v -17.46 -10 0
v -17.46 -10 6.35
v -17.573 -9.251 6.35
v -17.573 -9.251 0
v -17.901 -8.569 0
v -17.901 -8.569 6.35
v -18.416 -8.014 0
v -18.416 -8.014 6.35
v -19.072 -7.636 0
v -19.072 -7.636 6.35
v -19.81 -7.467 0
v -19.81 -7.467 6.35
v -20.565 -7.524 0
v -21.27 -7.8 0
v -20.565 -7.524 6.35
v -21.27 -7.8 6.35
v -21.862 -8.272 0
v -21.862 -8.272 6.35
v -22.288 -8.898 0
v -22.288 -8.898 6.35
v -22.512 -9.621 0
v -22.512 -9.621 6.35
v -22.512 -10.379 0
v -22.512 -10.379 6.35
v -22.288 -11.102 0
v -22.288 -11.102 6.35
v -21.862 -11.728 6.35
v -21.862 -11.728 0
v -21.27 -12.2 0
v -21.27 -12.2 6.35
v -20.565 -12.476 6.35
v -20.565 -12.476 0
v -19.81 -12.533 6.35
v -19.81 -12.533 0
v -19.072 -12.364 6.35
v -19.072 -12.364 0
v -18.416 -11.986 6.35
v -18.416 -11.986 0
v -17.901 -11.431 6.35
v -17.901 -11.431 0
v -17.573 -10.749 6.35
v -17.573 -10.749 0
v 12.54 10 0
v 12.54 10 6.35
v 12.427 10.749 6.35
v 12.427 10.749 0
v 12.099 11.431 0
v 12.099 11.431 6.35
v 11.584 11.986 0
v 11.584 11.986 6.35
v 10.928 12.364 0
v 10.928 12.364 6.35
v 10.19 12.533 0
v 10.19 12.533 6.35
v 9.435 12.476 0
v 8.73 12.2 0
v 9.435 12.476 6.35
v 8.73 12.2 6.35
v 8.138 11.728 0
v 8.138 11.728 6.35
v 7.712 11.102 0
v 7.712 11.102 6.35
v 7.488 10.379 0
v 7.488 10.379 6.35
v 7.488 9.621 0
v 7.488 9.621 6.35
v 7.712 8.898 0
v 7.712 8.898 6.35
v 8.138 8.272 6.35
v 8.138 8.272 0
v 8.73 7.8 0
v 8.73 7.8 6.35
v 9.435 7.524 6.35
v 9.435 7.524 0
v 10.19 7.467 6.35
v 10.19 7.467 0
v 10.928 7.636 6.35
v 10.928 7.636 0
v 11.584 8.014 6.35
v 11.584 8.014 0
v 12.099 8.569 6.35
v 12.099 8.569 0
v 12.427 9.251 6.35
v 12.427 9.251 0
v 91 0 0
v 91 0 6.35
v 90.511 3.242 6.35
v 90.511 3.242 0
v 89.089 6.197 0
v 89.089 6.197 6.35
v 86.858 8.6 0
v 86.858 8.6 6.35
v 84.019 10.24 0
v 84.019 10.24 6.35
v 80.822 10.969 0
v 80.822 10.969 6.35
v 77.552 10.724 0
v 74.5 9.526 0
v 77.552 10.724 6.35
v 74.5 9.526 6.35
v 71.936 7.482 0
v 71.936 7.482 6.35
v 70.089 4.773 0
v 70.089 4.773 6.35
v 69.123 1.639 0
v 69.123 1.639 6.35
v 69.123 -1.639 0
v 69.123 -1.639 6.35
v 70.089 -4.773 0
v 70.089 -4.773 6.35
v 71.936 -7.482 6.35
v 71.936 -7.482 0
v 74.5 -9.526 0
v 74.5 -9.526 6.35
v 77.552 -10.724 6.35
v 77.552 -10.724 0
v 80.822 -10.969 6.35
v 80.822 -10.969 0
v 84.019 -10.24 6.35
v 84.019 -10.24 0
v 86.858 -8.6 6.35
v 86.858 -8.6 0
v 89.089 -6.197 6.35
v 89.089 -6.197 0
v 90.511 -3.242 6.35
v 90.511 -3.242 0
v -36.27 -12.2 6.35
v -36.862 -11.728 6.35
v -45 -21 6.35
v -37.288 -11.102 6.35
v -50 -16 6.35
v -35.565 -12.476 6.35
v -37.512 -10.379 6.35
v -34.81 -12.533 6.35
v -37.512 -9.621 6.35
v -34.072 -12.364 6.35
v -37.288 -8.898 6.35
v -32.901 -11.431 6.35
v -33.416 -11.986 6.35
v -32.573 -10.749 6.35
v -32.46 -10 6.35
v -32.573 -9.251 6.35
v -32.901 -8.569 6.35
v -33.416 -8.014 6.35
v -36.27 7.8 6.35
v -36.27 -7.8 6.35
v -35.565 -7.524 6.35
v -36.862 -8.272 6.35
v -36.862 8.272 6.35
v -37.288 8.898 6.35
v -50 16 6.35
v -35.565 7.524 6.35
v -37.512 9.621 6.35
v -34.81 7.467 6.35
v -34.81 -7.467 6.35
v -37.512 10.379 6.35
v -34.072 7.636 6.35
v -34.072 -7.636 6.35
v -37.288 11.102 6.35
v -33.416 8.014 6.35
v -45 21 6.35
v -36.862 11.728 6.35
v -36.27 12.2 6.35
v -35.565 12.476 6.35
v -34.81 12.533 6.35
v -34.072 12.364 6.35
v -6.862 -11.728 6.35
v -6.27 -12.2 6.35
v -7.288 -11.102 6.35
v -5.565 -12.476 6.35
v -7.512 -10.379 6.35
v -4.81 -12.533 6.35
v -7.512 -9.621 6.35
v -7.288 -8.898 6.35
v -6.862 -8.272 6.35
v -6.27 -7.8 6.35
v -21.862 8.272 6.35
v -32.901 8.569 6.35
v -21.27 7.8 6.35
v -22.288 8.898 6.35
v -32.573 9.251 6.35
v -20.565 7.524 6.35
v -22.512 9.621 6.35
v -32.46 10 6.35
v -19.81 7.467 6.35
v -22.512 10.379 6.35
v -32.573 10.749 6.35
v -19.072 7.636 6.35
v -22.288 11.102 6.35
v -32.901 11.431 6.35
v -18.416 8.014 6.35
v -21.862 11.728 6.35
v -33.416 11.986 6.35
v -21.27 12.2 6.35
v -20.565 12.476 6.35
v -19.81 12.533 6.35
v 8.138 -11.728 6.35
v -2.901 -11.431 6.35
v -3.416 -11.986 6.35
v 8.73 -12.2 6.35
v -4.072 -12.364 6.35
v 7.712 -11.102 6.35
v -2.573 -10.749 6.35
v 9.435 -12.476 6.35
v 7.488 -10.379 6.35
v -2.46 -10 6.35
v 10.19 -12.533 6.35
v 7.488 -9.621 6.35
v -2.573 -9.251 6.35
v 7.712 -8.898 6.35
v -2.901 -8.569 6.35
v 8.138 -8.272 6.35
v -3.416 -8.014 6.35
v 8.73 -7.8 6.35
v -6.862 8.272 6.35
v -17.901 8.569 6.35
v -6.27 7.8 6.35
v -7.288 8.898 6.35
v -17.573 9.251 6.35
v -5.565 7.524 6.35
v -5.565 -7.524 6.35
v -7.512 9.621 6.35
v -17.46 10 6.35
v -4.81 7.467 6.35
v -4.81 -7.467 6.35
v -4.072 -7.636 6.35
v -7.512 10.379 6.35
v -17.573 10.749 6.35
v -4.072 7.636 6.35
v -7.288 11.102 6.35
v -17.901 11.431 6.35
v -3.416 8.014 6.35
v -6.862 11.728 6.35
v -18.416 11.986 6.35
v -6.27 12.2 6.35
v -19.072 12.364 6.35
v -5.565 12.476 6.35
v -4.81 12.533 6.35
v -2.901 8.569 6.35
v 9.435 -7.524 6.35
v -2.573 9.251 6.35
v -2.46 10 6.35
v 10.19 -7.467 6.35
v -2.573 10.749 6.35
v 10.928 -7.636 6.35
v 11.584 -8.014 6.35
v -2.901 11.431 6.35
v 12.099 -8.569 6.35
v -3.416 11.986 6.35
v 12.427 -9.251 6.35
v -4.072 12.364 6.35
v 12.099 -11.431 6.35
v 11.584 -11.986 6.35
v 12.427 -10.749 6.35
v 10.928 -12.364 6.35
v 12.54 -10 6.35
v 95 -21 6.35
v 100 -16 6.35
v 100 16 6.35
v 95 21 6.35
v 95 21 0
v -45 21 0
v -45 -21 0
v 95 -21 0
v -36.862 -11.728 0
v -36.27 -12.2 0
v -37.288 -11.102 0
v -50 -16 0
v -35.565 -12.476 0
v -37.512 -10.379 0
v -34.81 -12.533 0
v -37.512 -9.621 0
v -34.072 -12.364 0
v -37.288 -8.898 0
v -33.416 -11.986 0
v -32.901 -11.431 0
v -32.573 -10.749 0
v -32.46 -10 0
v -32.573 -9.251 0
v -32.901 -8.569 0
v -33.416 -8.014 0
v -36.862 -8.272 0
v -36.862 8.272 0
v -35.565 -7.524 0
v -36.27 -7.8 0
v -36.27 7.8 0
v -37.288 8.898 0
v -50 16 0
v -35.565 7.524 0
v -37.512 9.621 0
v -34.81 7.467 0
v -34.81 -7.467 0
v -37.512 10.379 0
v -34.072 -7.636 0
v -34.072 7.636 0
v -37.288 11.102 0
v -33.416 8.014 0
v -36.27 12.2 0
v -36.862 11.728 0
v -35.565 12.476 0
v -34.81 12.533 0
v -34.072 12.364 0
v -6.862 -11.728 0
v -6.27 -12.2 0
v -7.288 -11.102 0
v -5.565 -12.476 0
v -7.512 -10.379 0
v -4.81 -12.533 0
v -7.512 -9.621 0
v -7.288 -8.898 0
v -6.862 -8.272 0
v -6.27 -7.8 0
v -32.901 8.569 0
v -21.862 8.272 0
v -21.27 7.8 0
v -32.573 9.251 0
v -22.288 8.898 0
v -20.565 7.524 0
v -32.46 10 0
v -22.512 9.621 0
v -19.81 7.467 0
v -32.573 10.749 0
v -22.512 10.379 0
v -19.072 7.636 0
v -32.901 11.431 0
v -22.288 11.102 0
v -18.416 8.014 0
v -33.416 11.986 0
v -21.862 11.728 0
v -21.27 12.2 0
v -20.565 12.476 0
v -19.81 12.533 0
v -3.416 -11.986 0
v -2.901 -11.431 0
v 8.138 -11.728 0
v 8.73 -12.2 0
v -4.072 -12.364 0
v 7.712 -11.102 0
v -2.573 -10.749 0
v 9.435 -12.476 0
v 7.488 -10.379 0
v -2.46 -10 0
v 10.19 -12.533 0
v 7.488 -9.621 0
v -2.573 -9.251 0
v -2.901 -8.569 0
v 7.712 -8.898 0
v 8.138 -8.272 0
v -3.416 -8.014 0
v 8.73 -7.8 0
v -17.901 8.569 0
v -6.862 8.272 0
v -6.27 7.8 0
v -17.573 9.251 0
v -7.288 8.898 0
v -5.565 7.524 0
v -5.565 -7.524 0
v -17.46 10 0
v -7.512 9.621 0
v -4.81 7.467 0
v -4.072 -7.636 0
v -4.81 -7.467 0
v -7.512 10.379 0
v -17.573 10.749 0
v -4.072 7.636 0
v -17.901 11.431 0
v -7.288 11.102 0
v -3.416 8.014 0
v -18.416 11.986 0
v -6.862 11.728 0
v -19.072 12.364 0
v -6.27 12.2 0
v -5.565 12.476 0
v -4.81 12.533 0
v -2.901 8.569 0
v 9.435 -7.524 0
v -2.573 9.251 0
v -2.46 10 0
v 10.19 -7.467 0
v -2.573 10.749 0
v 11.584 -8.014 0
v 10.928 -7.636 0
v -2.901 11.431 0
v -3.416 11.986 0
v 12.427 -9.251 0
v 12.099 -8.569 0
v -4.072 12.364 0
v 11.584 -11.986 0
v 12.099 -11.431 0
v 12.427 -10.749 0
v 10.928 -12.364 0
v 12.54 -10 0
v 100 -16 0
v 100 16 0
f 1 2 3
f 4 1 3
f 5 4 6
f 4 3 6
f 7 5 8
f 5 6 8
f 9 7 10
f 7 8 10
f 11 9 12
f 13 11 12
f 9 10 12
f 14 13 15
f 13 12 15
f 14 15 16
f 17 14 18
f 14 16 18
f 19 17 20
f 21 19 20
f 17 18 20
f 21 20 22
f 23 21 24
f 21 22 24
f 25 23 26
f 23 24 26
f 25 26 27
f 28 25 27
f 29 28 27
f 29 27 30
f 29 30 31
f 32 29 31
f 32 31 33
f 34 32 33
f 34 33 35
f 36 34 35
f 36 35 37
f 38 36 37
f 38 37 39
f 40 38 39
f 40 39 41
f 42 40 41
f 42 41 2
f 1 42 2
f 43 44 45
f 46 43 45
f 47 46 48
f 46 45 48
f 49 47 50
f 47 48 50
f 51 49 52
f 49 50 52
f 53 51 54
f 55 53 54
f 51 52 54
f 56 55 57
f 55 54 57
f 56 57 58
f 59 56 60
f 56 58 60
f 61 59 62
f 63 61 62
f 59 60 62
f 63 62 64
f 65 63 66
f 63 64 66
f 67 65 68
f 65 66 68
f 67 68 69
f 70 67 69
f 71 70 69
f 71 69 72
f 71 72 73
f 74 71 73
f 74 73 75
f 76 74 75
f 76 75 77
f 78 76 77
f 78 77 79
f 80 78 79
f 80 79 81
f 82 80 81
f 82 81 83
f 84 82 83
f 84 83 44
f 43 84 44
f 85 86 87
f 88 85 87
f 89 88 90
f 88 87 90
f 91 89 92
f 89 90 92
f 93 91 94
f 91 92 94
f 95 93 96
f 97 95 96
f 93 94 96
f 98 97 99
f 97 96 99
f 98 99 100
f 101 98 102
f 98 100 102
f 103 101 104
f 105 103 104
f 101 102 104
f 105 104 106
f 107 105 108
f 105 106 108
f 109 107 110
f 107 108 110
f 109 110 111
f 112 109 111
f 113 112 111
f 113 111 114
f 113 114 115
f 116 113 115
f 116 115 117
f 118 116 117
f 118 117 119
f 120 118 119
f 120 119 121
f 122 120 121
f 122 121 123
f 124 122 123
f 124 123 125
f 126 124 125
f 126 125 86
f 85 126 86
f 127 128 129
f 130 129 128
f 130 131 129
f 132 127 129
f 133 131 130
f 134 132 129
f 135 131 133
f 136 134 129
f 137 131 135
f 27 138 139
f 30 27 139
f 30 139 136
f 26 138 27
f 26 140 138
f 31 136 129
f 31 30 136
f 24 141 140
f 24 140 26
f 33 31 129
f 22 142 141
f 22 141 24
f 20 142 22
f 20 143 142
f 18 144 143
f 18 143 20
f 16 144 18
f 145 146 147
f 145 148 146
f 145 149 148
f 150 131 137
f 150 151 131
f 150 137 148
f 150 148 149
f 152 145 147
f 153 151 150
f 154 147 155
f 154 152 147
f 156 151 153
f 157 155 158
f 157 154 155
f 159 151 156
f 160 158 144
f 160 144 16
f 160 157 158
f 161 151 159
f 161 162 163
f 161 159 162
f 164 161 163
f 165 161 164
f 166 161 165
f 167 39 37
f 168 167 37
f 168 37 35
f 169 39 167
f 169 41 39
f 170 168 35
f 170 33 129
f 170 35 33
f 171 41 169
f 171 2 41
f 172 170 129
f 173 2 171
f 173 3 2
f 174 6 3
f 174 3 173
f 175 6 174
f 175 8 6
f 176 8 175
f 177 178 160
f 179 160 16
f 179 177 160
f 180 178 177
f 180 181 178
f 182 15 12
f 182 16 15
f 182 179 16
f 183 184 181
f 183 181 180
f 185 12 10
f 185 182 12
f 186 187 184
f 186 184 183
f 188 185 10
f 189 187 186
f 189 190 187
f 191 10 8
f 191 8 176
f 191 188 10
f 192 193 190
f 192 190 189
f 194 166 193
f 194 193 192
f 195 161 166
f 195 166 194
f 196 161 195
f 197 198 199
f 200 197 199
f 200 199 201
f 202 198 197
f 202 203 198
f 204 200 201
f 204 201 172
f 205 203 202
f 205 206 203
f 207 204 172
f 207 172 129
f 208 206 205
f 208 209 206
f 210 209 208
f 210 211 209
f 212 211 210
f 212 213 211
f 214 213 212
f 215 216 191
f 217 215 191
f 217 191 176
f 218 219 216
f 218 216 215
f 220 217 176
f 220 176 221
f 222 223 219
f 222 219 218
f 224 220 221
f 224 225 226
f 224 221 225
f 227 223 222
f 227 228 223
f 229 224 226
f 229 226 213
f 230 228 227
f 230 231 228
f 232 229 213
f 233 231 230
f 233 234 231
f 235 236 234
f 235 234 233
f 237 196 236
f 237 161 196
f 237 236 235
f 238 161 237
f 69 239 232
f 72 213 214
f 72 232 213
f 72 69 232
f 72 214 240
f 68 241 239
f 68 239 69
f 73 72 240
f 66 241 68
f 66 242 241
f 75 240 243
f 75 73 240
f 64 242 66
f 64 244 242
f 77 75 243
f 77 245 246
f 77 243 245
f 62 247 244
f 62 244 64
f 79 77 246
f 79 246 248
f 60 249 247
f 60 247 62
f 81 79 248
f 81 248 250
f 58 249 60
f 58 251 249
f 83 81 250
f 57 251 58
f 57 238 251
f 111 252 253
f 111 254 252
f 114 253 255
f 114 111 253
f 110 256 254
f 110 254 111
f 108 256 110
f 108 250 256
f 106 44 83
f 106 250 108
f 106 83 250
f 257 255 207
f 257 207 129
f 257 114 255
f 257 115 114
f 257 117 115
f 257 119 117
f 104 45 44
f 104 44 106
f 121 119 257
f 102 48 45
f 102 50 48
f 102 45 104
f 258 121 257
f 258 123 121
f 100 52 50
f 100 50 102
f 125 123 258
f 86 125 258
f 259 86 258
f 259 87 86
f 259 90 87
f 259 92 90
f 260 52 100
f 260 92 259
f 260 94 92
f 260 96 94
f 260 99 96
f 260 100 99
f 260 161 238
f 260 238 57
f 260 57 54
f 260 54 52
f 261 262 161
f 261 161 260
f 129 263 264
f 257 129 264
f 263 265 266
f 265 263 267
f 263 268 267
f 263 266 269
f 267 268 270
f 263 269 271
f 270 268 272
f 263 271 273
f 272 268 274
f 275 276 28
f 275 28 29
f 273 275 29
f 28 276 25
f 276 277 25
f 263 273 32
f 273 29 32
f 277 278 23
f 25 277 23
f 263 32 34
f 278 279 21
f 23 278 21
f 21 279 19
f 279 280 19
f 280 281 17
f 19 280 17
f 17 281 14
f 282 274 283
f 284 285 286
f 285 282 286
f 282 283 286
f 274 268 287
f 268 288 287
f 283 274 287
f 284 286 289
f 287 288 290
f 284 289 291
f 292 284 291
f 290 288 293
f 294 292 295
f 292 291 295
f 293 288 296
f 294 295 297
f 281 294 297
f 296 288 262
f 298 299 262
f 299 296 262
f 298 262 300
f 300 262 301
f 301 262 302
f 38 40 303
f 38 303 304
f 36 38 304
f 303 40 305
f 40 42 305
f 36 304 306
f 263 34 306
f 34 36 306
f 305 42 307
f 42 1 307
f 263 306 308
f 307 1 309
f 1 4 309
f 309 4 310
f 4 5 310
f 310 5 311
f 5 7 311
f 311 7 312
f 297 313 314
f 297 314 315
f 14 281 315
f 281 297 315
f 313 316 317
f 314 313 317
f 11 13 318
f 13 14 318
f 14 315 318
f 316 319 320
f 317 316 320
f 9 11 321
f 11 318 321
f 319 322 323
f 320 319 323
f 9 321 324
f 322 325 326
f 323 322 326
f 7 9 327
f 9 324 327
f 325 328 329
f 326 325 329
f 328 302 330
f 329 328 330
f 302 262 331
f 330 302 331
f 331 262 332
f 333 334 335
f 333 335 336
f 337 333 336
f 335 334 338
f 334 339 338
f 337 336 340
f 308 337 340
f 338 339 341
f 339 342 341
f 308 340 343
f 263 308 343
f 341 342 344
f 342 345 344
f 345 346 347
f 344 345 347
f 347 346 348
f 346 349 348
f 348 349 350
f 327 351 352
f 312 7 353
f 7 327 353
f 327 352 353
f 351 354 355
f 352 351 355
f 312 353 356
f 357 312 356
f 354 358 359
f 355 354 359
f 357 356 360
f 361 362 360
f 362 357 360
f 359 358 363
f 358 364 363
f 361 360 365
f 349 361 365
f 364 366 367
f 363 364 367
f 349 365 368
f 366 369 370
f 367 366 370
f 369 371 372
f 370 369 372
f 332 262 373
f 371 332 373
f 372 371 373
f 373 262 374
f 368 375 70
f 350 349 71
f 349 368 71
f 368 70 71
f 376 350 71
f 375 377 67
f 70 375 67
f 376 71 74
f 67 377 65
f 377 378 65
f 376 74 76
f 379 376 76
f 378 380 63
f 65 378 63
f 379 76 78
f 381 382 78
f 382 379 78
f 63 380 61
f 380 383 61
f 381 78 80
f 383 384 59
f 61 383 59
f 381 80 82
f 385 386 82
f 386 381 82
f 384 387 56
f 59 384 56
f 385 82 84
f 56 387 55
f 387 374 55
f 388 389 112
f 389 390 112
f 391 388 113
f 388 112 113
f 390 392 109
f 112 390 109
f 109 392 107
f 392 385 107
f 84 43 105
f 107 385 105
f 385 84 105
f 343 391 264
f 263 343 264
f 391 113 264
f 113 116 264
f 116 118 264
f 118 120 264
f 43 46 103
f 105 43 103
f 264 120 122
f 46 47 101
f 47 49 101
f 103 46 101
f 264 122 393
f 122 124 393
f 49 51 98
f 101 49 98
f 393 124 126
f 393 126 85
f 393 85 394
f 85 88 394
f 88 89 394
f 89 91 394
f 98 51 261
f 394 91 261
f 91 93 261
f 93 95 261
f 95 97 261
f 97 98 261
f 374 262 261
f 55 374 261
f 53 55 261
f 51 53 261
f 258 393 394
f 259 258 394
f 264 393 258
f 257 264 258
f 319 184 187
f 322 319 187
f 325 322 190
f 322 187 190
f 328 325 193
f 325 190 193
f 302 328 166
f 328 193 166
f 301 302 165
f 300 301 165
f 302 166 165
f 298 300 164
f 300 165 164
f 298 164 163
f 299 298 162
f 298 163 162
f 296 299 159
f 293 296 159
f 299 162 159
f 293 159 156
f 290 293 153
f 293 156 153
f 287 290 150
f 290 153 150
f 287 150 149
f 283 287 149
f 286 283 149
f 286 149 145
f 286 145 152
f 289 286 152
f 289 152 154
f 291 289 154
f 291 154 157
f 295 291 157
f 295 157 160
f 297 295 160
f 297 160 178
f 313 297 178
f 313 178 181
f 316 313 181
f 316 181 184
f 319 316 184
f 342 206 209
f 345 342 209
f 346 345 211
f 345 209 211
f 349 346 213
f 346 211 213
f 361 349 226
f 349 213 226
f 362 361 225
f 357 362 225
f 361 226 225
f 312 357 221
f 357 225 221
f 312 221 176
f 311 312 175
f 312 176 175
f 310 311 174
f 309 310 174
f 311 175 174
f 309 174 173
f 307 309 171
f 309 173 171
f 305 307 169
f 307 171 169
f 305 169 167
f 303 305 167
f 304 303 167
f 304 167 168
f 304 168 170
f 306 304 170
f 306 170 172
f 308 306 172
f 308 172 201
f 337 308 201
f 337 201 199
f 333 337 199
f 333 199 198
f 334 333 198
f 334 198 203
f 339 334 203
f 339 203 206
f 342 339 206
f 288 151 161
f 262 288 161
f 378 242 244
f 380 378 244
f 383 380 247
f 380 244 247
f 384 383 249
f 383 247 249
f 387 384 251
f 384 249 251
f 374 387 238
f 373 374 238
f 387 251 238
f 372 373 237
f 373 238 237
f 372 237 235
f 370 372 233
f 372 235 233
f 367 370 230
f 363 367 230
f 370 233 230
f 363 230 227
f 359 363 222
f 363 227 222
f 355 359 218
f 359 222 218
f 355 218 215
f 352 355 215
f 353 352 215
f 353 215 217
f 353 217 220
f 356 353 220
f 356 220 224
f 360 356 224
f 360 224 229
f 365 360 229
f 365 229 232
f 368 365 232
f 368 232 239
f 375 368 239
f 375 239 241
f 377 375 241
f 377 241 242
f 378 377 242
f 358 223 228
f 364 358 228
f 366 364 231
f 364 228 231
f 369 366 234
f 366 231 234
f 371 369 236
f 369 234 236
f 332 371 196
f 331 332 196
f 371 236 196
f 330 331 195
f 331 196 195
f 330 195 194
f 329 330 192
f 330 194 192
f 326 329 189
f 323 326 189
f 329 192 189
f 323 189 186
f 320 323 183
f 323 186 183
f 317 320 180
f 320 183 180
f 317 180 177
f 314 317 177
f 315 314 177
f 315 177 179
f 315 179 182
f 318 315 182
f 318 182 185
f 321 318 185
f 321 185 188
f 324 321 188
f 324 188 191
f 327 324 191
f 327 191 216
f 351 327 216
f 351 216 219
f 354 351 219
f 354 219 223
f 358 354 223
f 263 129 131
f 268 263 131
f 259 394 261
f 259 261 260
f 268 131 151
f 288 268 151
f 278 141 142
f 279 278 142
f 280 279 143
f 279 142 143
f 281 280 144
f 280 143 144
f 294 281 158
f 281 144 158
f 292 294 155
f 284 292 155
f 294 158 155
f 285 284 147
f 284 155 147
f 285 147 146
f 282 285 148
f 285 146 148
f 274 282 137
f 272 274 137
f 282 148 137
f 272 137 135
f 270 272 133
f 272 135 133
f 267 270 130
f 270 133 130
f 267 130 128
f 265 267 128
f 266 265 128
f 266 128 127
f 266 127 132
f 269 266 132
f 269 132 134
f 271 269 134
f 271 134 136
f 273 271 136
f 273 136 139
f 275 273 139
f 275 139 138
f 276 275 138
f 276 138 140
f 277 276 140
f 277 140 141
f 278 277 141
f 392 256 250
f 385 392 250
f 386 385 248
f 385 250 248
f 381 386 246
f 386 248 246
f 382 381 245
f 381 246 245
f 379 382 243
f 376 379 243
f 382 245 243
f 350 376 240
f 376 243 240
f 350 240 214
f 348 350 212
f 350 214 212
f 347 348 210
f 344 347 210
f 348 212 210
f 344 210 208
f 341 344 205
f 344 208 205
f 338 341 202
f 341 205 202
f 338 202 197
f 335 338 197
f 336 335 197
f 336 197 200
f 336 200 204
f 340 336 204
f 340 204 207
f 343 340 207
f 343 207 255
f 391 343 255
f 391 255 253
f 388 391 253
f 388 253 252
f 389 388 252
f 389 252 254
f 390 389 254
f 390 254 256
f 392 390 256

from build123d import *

# Parameters (mm, degrees)
SKETCH1_W           = 200
SKETCH1_H           = 42
BOSS_EXTRUDE1_DEPTH = 6.35
SKETCH4_R           = 2.286
CUT_EXTRUDE3_DEPTH  = 7.35
CHAMFER1_SIZE       = 5
SKETCH9_R           = 11
CUT_EXTRUDE8_DEPTH  = 7.35
SKETCH12_R          = 2.286
CUT_EXTRUDE11_DEPTH = 7.35
SKETCH13_R          = 2.286
SKETCH13_R_2        = 2.54
CUT_EXTRUDE12_DEPTH = 10


with BuildPart() as part:
    # Sketch1 → Boss-Extrude1 (new body)
    with BuildSketch(Plane.XY):
        Rectangle(SKETCH1_W, SKETCH1_H)
    extrude(amount=BOSS_EXTRUDE1_DEPTH)

    # Sketch4 → Cut-Extrude3 (cut, through all)
    with BuildSketch(Plane.XY.offset(6.35)):
        with Locations((-76, 0)):
            Circle(SKETCH4_R)
    extrude(amount=-CUT_EXTRUDE3_DEPTH, mode=Mode.SUBTRACT)

    # Chamfer1
    chamfer1_edges = [part.edges().sort_by_distance(p)[0] for p in [
        (100, -21, 3.175),
        (-100, -21, 3.175),
        (-100, 21, 3.175),
        (100, 21, 3.175),
    ]]
    chamfer(chamfer1_edges, length=CHAMFER1_SIZE)

    # Sketch9 → Cut-Extrude8 (cut, through all)
    with BuildSketch(Plane.XY.offset(6.35)):
        with Locations((80, 0)):
            Circle(SKETCH9_R)
    extrude(amount=-CUT_EXTRUDE8_DEPTH, mode=Mode.SUBTRACT)

    # Sketch12 → Cut-Extrude11 (cut, through all)
    with BuildSketch(Plane.XY.offset(6.35)):
        with Locations((-93, 0)):
            Circle(SKETCH12_R)
    extrude(amount=-CUT_EXTRUDE11_DEPTH, mode=Mode.SUBTRACT)

    # Sketch13 → Cut-Extrude12 (cut)
    with BuildSketch(Plane.XY.offset(6.35)):
        Polygon((-50, -16), (-50, 16), (-45, 21), (-95, 21), (-100, 16), (-100, -16), (-95, -21), (-45, -21), align=None)
        with Locations((-93, 0)):
            Circle(SKETCH13_R, mode=Mode.SUBTRACT)
        with Locations((-76, 0)):
            Circle(SKETCH13_R, mode=Mode.SUBTRACT)
        with Locations((-35, 10)):
            Circle(SKETCH13_R_2)
        with Locations((-35, -10)):
            Circle(SKETCH13_R_2)
        with Locations((-20, 10)):
            Circle(SKETCH13_R_2)
        with Locations((-20, -10)):
            Circle(SKETCH13_R_2)
        with Locations((-5, 10)):
            Circle(SKETCH13_R_2)
        with Locations((-5, -10)):
            Circle(SKETCH13_R_2)
        with Locations((10, 10)):
            Circle(SKETCH13_R_2)
        with Locations((10, -10)):
            Circle(SKETCH13_R_2)
    extrude(amount=-CUT_EXTRUDE12_DEPTH, mode=Mode.SUBTRACT)


solid = part.part
